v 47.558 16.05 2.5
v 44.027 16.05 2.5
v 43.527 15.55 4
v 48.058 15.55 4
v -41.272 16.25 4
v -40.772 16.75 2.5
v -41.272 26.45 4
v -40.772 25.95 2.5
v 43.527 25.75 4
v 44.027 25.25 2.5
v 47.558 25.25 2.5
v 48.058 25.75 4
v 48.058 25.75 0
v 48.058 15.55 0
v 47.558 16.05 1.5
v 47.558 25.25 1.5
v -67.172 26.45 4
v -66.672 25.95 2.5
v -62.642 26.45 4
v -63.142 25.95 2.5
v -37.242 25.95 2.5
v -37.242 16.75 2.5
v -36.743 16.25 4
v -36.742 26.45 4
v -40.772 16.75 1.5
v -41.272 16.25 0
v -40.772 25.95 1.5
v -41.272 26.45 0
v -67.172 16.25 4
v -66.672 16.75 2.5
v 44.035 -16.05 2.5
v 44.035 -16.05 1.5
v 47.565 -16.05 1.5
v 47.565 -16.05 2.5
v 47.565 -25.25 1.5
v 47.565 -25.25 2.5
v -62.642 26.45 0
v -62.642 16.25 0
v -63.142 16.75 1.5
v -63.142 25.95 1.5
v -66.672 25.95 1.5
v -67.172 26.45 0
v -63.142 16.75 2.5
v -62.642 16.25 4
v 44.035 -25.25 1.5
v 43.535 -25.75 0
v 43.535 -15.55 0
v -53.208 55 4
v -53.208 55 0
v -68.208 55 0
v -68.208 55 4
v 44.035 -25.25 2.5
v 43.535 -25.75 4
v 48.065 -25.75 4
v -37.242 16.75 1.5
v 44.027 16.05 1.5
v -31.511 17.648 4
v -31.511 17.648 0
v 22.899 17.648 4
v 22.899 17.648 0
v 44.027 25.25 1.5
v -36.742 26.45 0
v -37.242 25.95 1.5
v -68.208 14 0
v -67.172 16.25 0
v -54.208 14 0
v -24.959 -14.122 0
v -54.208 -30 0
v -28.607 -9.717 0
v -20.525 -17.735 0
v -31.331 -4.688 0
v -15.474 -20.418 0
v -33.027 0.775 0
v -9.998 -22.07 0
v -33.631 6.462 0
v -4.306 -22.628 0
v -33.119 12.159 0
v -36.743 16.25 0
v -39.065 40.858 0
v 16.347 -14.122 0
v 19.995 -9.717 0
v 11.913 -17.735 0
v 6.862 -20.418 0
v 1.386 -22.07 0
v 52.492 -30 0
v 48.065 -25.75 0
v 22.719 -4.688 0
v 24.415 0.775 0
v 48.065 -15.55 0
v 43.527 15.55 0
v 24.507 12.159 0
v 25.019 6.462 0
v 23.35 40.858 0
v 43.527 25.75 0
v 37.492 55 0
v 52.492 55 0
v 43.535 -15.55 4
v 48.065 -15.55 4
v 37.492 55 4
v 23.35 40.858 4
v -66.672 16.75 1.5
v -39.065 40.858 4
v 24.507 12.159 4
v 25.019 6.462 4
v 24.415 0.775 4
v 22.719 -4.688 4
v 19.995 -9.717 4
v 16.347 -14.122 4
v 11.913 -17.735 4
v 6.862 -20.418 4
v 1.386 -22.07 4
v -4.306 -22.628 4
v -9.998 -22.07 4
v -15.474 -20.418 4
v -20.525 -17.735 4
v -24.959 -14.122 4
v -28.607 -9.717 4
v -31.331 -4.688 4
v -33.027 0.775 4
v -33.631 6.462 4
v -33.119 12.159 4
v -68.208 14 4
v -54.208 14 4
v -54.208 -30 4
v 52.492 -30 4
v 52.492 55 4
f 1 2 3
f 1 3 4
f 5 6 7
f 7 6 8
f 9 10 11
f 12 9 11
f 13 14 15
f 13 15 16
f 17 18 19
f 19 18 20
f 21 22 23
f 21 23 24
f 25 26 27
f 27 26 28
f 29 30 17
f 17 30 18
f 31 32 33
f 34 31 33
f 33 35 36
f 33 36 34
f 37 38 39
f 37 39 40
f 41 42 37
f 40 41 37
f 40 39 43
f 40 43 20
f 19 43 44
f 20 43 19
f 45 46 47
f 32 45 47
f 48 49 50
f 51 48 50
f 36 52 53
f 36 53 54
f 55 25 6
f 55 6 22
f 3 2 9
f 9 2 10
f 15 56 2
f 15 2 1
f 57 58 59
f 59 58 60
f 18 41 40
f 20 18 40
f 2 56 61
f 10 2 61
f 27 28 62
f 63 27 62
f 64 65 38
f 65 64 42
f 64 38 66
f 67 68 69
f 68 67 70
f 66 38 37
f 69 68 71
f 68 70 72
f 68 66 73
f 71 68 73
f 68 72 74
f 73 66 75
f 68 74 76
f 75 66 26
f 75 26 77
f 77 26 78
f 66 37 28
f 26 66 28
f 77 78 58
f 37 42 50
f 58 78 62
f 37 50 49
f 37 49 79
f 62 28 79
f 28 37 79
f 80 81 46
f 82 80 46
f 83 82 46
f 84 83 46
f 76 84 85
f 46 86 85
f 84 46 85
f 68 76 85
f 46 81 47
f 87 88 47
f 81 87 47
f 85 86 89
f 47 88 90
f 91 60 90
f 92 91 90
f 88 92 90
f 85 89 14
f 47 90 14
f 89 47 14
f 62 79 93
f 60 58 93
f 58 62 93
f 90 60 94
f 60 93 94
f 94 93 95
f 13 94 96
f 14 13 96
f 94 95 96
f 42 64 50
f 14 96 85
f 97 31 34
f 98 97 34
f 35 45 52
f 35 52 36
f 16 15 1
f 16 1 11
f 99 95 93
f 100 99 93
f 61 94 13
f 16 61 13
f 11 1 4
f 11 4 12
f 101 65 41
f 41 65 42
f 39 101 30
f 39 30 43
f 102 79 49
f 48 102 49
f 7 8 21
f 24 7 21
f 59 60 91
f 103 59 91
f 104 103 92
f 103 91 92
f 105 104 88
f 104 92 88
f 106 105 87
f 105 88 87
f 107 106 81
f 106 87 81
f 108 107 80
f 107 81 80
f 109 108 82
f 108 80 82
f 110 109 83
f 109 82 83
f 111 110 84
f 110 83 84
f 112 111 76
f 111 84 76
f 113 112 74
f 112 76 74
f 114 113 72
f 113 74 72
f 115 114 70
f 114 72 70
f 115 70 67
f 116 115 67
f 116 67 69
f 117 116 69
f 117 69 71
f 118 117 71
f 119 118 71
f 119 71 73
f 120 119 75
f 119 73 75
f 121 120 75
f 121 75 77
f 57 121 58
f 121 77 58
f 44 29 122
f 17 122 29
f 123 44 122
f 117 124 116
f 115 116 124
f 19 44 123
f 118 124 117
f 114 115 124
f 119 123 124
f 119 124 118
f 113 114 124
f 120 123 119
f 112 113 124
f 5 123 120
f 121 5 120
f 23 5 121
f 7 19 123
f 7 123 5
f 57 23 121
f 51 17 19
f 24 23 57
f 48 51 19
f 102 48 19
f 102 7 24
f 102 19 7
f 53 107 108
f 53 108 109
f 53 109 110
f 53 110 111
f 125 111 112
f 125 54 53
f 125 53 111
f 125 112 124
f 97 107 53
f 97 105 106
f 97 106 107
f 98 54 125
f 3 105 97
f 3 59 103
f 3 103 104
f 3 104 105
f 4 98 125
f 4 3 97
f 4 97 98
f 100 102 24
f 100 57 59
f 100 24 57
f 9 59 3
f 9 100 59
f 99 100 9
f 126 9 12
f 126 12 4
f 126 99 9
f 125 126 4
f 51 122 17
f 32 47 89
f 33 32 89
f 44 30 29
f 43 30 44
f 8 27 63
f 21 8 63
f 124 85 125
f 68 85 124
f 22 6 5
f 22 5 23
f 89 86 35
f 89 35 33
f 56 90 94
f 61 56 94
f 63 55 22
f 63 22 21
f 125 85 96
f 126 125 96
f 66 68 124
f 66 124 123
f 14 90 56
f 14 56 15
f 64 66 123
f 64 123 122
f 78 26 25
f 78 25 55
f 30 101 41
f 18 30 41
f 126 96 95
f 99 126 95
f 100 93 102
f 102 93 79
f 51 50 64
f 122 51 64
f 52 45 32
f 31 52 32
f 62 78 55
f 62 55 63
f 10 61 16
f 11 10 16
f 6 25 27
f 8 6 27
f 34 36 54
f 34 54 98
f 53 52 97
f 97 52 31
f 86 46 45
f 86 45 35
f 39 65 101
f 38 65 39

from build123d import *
from OCP.BRepFilletAPI import BRepFilletAPI_MakeChamfer

# Parameters (mm, degrees)
SKETCH1_W           = 3.53
SKETCH1_H           = 9.2
BOSS_EXTRUDE1_DEPTH = 4
BOSS_EXTRUDE2_DEPTH = 4
CHAMFER1_SIZE       = 1.5
CHAMFER1_SIZE2      = 0.5
CHAMFER2_SIZE       = 0.5
CHAMFER2_SIZE2      = 1.5


with BuildPart() as part:
    # Sketch1 → Boss-Extrude1 (new body)
    with BuildSketch(Plane.XY):
        Polygon((52.4925, 30), (52.4925, -30), (-54.2075, -30), (-54.2075, 14), (-68.2075, 14), (-68.2075, 30), align=None)
        with BuildLine():
            Line((-31.510630119, 17.647843267), (22.89855475, 17.647843267))
            ThreePointArc((22.89855475, 17.647843267), (-4.306037684, -22.627990687), (-31.510630119, 17.647843267))
        make_face(mode=Mode.SUBTRACT)
        with Locations((-39.0075, 21.35)):
            Rectangle(SKETCH1_W, SKETCH1_H, mode=Mode.SUBTRACT)
        with Locations((45.7925, 20.65)):
            Rectangle(SKETCH1_W, SKETCH1_H, mode=Mode.SUBTRACT)
        with Locations((45.8, -20.65)):
            Rectangle(SKETCH1_W, SKETCH1_H, mode=Mode.SUBTRACT)
        with Locations((-64.9075, 21.35)):
            Rectangle(SKETCH1_W, SKETCH1_H, mode=Mode.SUBTRACT)
    extrude(amount=BOSS_EXTRUDE1_DEPTH)

    # Sketch2 → Boss-Extrude2 (add)
    with BuildSketch(Plane.XY):
        Polygon((-68.2075, 30), (52.4925, 30), (52.4925, 55), (37.4925, 55), (23.350364376, 40.857864376), (-39.065364376, 40.857864376), (-53.2075, 55), (-68.2075, 55), align=None)
    extrude(amount=BOSS_EXTRUDE2_DEPTH)

    # Chamfer1: one chamfer whose edges measure the first distance from different faces: ONE call of the kernel's chamfer builder (chamfer() names one face for all edges)
    chamfer1_edges_1 = [part.edges().sort_by_distance(p)[0] for p in [
        (-40.7725, 21.35, 0),
    ]]
    chamfer1_side_1 = [part.faces().sort_by_distance(p)[0] for p in [
        (-40.7725, 21.35, 2),
    ]]
    chamfer1_edges_2 = [part.edges().sort_by_distance(p)[0] for p in [
        (-39.0075, 16.75, 0),
    ]]
    chamfer1_side_2 = [part.faces().sort_by_distance(p)[0] for p in [
        (-39.0075, 16.75, 2),
    ]]
    chamfer1_edges_3 = [part.edges().sort_by_distance(p)[0] for p in [
        (-37.2425, 21.35, 0),
    ]]
    chamfer1_side_3 = [part.faces().sort_by_distance(p)[0] for p in [
        (-37.2425, 21.35, 2),
    ]]
    chamfer1_edges_4 = [part.edges().sort_by_distance(p)[0] for p in [
        (-39.0075, 25.95, 0),
    ]]
    chamfer1_side_4 = [part.faces().sort_by_distance(p)[0] for p in [
        (-39.0075, 25.95, 2),
    ]]
    chamfer1_edges_5 = [part.edges().sort_by_distance(p)[0] for p in [
        (-66.6725, 21.35, 0),
    ]]
    chamfer1_side_5 = [part.faces().sort_by_distance(p)[0] for p in [
        (-66.6725, 21.35, 2),
    ]]
    chamfer1_edges_6 = [part.edges().sort_by_distance(p)[0] for p in [
        (-64.9075, 16.75, 0),
    ]]
    chamfer1_side_6 = [part.faces().sort_by_distance(p)[0] for p in [
        (-64.9075, 16.75, 2),
    ]]
    chamfer1_edges_7 = [part.edges().sort_by_distance(p)[0] for p in [
        (-63.1425, 21.35, 0),
    ]]
    chamfer1_side_7 = [part.faces().sort_by_distance(p)[0] for p in [
        (-63.1425, 21.35, 2),
    ]]
    chamfer1_edges_8 = [part.edges().sort_by_distance(p)[0] for p in [
        (-64.9075, 25.95, 0),
    ]]
    chamfer1_side_8 = [part.faces().sort_by_distance(p)[0] for p in [
        (-64.9075, 25.95, 2),
    ]]
    chamfer1_edges_9 = [part.edges().sort_by_distance(p)[0] for p in [
        (44.0275, 20.65, 0),
    ]]
    chamfer1_side_9 = [part.faces().sort_by_distance(p)[0] for p in [
        (44.0275, 20.65, 2),
    ]]
    chamfer1_edges_10 = [part.edges().sort_by_distance(p)[0] for p in [
        (45.7925, 16.05, 0),
    ]]
    chamfer1_side_10 = [part.faces().sort_by_distance(p)[0] for p in [
        (45.7925, 16.05, 2),
    ]]
    chamfer1_edges_11 = [part.edges().sort_by_distance(p)[0] for p in [
        (47.5575, 20.65, 0),
    ]]
    chamfer1_side_11 = [part.faces().sort_by_distance(p)[0] for p in [
        (47.5575, 20.65, 2),
    ]]
    chamfer1_edges_12 = [part.edges().sort_by_distance(p)[0] for p in [
        (45.7925, 25.25, 0),
    ]]
    chamfer1_side_12 = [part.faces().sort_by_distance(p)[0] for p in [
        (45.7925, 25.25, 2),
    ]]
    chamfer1_edges_13 = [part.edges().sort_by_distance(p)[0] for p in [
        (47.565, -20.65, 0),
    ]]
    chamfer1_side_13 = [part.faces().sort_by_distance(p)[0] for p in [
        (47.565, -20.65, 2),
    ]]
    chamfer1_edges_14 = [part.edges().sort_by_distance(p)[0] for p in [
        (45.8, -16.05, 0),
    ]]
    chamfer1_side_14 = [part.faces().sort_by_distance(p)[0] for p in [
        (45.8, -16.05, 2),
    ]]
    chamfer1_edges_15 = [part.edges().sort_by_distance(p)[0] for p in [
        (44.035, -20.65, 0),
    ]]
    chamfer1_side_15 = [part.faces().sort_by_distance(p)[0] for p in [
        (44.035, -20.65, 2),
    ]]
    chamfer1_edges_16 = [part.edges().sort_by_distance(p)[0] for p in [
        (45.8, -25.25, 0),
    ]]
    chamfer1_side_16 = [part.faces().sort_by_distance(p)[0] for p in [
        (45.8, -25.25, 2),
    ]]
    chamfer1 = BRepFilletAPI_MakeChamfer(part.part.solid().wrapped)
    for e in chamfer1_edges_1:
        chamfer1.Add(CHAMFER1_SIZE, CHAMFER1_SIZE2, e.wrapped, chamfer1_side_1[0].wrapped)  # the first distance lies on this face
    for e in chamfer1_edges_2:
        chamfer1.Add(CHAMFER1_SIZE, CHAMFER1_SIZE2, e.wrapped, chamfer1_side_2[0].wrapped)  # the first distance lies on this face
    for e in chamfer1_edges_3:
        chamfer1.Add(CHAMFER1_SIZE, CHAMFER1_SIZE2, e.wrapped, chamfer1_side_3[0].wrapped)  # the first distance lies on this face
    for e in chamfer1_edges_4:
        chamfer1.Add(CHAMFER1_SIZE, CHAMFER1_SIZE2, e.wrapped, chamfer1_side_4[0].wrapped)  # the first distance lies on this face
    for e in chamfer1_edges_5:
        chamfer1.Add(CHAMFER1_SIZE, CHAMFER1_SIZE2, e.wrapped, chamfer1_side_5[0].wrapped)  # the first distance lies on this face
    for e in chamfer1_edges_6:
        chamfer1.Add(CHAMFER1_SIZE, CHAMFER1_SIZE2, e.wrapped, chamfer1_side_6[0].wrapped)  # the first distance lies on this face
    for e in chamfer1_edges_7:
        chamfer1.Add(CHAMFER1_SIZE, CHAMFER1_SIZE2, e.wrapped, chamfer1_side_7[0].wrapped)  # the first distance lies on this face
    for e in chamfer1_edges_8:
        chamfer1.Add(CHAMFER1_SIZE, CHAMFER1_SIZE2, e.wrapped, chamfer1_side_8[0].wrapped)  # the first distance lies on this face
    for e in chamfer1_edges_9:
        chamfer1.Add(CHAMFER1_SIZE, CHAMFER1_SIZE2, e.wrapped, chamfer1_side_9[0].wrapped)  # the first distance lies on this face
    for e in chamfer1_edges_10:
        chamfer1.Add(CHAMFER1_SIZE, CHAMFER1_SIZE2, e.wrapped, chamfer1_side_10[0].wrapped)  # the first distance lies on this face
    for e in chamfer1_edges_11:
        chamfer1.Add(CHAMFER1_SIZE, CHAMFER1_SIZE2, e.wrapped, chamfer1_side_11[0].wrapped)  # the first distance lies on this face
    for e in chamfer1_edges_12:
        chamfer1.Add(CHAMFER1_SIZE, CHAMFER1_SIZE2, e.wrapped, chamfer1_side_12[0].wrapped)  # the first distance lies on this face
    for e in chamfer1_edges_13:
        chamfer1.Add(CHAMFER1_SIZE, CHAMFER1_SIZE2, e.wrapped, chamfer1_side_13[0].wrapped)  # the first distance lies on this face
    for e in chamfer1_edges_14:
        chamfer1.Add(CHAMFER1_SIZE, CHAMFER1_SIZE2, e.wrapped, chamfer1_side_14[0].wrapped)  # the first distance lies on this face
    for e in chamfer1_edges_15:
        chamfer1.Add(CHAMFER1_SIZE, CHAMFER1_SIZE2, e.wrapped, chamfer1_side_15[0].wrapped)  # the first distance lies on this face
    for e in chamfer1_edges_16:
        chamfer1.Add(CHAMFER1_SIZE, CHAMFER1_SIZE2, e.wrapped, chamfer1_side_16[0].wrapped)  # the first distance lies on this face
    add(Compound.cast(chamfer1.Shape()), mode=Mode.REPLACE)

    # Chamfer2
    chamfer2_edges = [part.edges().sort_by_distance(p)[0] for p in [
        (-40.7725, 21.35, 4),
        (-39.0075, 16.75, 4),
        (-37.2425, 21.35, 4),
        (-39.0075, 25.95, 4),
        (-66.6725, 21.35, 4),
        (-64.9075, 16.75, 4),
        (-63.1425, 21.35, 4),
        (-64.9075, 25.95, 4),
        (44.0275, 20.65, 4),
        (45.7925, 16.05, 4),
        (47.5575, 20.65, 4),
        (45.7925, 25.25, 4),
        (47.565, -20.65, 4),
        (45.8, -16.05, 4),
        (44.035, -20.65, 4),
        (45.8, -25.25, 4),
    ]]
    chamfer2_side = [part.faces().sort_by_distance(p)[0] for p in [
        (-0.8575, -28.523738167, 4),
    ]]
    chamfer(chamfer2_edges, length=CHAMFER2_SIZE, length2=CHAMFER2_SIZE2, reference=chamfer2_side[0])


solid = part.part
